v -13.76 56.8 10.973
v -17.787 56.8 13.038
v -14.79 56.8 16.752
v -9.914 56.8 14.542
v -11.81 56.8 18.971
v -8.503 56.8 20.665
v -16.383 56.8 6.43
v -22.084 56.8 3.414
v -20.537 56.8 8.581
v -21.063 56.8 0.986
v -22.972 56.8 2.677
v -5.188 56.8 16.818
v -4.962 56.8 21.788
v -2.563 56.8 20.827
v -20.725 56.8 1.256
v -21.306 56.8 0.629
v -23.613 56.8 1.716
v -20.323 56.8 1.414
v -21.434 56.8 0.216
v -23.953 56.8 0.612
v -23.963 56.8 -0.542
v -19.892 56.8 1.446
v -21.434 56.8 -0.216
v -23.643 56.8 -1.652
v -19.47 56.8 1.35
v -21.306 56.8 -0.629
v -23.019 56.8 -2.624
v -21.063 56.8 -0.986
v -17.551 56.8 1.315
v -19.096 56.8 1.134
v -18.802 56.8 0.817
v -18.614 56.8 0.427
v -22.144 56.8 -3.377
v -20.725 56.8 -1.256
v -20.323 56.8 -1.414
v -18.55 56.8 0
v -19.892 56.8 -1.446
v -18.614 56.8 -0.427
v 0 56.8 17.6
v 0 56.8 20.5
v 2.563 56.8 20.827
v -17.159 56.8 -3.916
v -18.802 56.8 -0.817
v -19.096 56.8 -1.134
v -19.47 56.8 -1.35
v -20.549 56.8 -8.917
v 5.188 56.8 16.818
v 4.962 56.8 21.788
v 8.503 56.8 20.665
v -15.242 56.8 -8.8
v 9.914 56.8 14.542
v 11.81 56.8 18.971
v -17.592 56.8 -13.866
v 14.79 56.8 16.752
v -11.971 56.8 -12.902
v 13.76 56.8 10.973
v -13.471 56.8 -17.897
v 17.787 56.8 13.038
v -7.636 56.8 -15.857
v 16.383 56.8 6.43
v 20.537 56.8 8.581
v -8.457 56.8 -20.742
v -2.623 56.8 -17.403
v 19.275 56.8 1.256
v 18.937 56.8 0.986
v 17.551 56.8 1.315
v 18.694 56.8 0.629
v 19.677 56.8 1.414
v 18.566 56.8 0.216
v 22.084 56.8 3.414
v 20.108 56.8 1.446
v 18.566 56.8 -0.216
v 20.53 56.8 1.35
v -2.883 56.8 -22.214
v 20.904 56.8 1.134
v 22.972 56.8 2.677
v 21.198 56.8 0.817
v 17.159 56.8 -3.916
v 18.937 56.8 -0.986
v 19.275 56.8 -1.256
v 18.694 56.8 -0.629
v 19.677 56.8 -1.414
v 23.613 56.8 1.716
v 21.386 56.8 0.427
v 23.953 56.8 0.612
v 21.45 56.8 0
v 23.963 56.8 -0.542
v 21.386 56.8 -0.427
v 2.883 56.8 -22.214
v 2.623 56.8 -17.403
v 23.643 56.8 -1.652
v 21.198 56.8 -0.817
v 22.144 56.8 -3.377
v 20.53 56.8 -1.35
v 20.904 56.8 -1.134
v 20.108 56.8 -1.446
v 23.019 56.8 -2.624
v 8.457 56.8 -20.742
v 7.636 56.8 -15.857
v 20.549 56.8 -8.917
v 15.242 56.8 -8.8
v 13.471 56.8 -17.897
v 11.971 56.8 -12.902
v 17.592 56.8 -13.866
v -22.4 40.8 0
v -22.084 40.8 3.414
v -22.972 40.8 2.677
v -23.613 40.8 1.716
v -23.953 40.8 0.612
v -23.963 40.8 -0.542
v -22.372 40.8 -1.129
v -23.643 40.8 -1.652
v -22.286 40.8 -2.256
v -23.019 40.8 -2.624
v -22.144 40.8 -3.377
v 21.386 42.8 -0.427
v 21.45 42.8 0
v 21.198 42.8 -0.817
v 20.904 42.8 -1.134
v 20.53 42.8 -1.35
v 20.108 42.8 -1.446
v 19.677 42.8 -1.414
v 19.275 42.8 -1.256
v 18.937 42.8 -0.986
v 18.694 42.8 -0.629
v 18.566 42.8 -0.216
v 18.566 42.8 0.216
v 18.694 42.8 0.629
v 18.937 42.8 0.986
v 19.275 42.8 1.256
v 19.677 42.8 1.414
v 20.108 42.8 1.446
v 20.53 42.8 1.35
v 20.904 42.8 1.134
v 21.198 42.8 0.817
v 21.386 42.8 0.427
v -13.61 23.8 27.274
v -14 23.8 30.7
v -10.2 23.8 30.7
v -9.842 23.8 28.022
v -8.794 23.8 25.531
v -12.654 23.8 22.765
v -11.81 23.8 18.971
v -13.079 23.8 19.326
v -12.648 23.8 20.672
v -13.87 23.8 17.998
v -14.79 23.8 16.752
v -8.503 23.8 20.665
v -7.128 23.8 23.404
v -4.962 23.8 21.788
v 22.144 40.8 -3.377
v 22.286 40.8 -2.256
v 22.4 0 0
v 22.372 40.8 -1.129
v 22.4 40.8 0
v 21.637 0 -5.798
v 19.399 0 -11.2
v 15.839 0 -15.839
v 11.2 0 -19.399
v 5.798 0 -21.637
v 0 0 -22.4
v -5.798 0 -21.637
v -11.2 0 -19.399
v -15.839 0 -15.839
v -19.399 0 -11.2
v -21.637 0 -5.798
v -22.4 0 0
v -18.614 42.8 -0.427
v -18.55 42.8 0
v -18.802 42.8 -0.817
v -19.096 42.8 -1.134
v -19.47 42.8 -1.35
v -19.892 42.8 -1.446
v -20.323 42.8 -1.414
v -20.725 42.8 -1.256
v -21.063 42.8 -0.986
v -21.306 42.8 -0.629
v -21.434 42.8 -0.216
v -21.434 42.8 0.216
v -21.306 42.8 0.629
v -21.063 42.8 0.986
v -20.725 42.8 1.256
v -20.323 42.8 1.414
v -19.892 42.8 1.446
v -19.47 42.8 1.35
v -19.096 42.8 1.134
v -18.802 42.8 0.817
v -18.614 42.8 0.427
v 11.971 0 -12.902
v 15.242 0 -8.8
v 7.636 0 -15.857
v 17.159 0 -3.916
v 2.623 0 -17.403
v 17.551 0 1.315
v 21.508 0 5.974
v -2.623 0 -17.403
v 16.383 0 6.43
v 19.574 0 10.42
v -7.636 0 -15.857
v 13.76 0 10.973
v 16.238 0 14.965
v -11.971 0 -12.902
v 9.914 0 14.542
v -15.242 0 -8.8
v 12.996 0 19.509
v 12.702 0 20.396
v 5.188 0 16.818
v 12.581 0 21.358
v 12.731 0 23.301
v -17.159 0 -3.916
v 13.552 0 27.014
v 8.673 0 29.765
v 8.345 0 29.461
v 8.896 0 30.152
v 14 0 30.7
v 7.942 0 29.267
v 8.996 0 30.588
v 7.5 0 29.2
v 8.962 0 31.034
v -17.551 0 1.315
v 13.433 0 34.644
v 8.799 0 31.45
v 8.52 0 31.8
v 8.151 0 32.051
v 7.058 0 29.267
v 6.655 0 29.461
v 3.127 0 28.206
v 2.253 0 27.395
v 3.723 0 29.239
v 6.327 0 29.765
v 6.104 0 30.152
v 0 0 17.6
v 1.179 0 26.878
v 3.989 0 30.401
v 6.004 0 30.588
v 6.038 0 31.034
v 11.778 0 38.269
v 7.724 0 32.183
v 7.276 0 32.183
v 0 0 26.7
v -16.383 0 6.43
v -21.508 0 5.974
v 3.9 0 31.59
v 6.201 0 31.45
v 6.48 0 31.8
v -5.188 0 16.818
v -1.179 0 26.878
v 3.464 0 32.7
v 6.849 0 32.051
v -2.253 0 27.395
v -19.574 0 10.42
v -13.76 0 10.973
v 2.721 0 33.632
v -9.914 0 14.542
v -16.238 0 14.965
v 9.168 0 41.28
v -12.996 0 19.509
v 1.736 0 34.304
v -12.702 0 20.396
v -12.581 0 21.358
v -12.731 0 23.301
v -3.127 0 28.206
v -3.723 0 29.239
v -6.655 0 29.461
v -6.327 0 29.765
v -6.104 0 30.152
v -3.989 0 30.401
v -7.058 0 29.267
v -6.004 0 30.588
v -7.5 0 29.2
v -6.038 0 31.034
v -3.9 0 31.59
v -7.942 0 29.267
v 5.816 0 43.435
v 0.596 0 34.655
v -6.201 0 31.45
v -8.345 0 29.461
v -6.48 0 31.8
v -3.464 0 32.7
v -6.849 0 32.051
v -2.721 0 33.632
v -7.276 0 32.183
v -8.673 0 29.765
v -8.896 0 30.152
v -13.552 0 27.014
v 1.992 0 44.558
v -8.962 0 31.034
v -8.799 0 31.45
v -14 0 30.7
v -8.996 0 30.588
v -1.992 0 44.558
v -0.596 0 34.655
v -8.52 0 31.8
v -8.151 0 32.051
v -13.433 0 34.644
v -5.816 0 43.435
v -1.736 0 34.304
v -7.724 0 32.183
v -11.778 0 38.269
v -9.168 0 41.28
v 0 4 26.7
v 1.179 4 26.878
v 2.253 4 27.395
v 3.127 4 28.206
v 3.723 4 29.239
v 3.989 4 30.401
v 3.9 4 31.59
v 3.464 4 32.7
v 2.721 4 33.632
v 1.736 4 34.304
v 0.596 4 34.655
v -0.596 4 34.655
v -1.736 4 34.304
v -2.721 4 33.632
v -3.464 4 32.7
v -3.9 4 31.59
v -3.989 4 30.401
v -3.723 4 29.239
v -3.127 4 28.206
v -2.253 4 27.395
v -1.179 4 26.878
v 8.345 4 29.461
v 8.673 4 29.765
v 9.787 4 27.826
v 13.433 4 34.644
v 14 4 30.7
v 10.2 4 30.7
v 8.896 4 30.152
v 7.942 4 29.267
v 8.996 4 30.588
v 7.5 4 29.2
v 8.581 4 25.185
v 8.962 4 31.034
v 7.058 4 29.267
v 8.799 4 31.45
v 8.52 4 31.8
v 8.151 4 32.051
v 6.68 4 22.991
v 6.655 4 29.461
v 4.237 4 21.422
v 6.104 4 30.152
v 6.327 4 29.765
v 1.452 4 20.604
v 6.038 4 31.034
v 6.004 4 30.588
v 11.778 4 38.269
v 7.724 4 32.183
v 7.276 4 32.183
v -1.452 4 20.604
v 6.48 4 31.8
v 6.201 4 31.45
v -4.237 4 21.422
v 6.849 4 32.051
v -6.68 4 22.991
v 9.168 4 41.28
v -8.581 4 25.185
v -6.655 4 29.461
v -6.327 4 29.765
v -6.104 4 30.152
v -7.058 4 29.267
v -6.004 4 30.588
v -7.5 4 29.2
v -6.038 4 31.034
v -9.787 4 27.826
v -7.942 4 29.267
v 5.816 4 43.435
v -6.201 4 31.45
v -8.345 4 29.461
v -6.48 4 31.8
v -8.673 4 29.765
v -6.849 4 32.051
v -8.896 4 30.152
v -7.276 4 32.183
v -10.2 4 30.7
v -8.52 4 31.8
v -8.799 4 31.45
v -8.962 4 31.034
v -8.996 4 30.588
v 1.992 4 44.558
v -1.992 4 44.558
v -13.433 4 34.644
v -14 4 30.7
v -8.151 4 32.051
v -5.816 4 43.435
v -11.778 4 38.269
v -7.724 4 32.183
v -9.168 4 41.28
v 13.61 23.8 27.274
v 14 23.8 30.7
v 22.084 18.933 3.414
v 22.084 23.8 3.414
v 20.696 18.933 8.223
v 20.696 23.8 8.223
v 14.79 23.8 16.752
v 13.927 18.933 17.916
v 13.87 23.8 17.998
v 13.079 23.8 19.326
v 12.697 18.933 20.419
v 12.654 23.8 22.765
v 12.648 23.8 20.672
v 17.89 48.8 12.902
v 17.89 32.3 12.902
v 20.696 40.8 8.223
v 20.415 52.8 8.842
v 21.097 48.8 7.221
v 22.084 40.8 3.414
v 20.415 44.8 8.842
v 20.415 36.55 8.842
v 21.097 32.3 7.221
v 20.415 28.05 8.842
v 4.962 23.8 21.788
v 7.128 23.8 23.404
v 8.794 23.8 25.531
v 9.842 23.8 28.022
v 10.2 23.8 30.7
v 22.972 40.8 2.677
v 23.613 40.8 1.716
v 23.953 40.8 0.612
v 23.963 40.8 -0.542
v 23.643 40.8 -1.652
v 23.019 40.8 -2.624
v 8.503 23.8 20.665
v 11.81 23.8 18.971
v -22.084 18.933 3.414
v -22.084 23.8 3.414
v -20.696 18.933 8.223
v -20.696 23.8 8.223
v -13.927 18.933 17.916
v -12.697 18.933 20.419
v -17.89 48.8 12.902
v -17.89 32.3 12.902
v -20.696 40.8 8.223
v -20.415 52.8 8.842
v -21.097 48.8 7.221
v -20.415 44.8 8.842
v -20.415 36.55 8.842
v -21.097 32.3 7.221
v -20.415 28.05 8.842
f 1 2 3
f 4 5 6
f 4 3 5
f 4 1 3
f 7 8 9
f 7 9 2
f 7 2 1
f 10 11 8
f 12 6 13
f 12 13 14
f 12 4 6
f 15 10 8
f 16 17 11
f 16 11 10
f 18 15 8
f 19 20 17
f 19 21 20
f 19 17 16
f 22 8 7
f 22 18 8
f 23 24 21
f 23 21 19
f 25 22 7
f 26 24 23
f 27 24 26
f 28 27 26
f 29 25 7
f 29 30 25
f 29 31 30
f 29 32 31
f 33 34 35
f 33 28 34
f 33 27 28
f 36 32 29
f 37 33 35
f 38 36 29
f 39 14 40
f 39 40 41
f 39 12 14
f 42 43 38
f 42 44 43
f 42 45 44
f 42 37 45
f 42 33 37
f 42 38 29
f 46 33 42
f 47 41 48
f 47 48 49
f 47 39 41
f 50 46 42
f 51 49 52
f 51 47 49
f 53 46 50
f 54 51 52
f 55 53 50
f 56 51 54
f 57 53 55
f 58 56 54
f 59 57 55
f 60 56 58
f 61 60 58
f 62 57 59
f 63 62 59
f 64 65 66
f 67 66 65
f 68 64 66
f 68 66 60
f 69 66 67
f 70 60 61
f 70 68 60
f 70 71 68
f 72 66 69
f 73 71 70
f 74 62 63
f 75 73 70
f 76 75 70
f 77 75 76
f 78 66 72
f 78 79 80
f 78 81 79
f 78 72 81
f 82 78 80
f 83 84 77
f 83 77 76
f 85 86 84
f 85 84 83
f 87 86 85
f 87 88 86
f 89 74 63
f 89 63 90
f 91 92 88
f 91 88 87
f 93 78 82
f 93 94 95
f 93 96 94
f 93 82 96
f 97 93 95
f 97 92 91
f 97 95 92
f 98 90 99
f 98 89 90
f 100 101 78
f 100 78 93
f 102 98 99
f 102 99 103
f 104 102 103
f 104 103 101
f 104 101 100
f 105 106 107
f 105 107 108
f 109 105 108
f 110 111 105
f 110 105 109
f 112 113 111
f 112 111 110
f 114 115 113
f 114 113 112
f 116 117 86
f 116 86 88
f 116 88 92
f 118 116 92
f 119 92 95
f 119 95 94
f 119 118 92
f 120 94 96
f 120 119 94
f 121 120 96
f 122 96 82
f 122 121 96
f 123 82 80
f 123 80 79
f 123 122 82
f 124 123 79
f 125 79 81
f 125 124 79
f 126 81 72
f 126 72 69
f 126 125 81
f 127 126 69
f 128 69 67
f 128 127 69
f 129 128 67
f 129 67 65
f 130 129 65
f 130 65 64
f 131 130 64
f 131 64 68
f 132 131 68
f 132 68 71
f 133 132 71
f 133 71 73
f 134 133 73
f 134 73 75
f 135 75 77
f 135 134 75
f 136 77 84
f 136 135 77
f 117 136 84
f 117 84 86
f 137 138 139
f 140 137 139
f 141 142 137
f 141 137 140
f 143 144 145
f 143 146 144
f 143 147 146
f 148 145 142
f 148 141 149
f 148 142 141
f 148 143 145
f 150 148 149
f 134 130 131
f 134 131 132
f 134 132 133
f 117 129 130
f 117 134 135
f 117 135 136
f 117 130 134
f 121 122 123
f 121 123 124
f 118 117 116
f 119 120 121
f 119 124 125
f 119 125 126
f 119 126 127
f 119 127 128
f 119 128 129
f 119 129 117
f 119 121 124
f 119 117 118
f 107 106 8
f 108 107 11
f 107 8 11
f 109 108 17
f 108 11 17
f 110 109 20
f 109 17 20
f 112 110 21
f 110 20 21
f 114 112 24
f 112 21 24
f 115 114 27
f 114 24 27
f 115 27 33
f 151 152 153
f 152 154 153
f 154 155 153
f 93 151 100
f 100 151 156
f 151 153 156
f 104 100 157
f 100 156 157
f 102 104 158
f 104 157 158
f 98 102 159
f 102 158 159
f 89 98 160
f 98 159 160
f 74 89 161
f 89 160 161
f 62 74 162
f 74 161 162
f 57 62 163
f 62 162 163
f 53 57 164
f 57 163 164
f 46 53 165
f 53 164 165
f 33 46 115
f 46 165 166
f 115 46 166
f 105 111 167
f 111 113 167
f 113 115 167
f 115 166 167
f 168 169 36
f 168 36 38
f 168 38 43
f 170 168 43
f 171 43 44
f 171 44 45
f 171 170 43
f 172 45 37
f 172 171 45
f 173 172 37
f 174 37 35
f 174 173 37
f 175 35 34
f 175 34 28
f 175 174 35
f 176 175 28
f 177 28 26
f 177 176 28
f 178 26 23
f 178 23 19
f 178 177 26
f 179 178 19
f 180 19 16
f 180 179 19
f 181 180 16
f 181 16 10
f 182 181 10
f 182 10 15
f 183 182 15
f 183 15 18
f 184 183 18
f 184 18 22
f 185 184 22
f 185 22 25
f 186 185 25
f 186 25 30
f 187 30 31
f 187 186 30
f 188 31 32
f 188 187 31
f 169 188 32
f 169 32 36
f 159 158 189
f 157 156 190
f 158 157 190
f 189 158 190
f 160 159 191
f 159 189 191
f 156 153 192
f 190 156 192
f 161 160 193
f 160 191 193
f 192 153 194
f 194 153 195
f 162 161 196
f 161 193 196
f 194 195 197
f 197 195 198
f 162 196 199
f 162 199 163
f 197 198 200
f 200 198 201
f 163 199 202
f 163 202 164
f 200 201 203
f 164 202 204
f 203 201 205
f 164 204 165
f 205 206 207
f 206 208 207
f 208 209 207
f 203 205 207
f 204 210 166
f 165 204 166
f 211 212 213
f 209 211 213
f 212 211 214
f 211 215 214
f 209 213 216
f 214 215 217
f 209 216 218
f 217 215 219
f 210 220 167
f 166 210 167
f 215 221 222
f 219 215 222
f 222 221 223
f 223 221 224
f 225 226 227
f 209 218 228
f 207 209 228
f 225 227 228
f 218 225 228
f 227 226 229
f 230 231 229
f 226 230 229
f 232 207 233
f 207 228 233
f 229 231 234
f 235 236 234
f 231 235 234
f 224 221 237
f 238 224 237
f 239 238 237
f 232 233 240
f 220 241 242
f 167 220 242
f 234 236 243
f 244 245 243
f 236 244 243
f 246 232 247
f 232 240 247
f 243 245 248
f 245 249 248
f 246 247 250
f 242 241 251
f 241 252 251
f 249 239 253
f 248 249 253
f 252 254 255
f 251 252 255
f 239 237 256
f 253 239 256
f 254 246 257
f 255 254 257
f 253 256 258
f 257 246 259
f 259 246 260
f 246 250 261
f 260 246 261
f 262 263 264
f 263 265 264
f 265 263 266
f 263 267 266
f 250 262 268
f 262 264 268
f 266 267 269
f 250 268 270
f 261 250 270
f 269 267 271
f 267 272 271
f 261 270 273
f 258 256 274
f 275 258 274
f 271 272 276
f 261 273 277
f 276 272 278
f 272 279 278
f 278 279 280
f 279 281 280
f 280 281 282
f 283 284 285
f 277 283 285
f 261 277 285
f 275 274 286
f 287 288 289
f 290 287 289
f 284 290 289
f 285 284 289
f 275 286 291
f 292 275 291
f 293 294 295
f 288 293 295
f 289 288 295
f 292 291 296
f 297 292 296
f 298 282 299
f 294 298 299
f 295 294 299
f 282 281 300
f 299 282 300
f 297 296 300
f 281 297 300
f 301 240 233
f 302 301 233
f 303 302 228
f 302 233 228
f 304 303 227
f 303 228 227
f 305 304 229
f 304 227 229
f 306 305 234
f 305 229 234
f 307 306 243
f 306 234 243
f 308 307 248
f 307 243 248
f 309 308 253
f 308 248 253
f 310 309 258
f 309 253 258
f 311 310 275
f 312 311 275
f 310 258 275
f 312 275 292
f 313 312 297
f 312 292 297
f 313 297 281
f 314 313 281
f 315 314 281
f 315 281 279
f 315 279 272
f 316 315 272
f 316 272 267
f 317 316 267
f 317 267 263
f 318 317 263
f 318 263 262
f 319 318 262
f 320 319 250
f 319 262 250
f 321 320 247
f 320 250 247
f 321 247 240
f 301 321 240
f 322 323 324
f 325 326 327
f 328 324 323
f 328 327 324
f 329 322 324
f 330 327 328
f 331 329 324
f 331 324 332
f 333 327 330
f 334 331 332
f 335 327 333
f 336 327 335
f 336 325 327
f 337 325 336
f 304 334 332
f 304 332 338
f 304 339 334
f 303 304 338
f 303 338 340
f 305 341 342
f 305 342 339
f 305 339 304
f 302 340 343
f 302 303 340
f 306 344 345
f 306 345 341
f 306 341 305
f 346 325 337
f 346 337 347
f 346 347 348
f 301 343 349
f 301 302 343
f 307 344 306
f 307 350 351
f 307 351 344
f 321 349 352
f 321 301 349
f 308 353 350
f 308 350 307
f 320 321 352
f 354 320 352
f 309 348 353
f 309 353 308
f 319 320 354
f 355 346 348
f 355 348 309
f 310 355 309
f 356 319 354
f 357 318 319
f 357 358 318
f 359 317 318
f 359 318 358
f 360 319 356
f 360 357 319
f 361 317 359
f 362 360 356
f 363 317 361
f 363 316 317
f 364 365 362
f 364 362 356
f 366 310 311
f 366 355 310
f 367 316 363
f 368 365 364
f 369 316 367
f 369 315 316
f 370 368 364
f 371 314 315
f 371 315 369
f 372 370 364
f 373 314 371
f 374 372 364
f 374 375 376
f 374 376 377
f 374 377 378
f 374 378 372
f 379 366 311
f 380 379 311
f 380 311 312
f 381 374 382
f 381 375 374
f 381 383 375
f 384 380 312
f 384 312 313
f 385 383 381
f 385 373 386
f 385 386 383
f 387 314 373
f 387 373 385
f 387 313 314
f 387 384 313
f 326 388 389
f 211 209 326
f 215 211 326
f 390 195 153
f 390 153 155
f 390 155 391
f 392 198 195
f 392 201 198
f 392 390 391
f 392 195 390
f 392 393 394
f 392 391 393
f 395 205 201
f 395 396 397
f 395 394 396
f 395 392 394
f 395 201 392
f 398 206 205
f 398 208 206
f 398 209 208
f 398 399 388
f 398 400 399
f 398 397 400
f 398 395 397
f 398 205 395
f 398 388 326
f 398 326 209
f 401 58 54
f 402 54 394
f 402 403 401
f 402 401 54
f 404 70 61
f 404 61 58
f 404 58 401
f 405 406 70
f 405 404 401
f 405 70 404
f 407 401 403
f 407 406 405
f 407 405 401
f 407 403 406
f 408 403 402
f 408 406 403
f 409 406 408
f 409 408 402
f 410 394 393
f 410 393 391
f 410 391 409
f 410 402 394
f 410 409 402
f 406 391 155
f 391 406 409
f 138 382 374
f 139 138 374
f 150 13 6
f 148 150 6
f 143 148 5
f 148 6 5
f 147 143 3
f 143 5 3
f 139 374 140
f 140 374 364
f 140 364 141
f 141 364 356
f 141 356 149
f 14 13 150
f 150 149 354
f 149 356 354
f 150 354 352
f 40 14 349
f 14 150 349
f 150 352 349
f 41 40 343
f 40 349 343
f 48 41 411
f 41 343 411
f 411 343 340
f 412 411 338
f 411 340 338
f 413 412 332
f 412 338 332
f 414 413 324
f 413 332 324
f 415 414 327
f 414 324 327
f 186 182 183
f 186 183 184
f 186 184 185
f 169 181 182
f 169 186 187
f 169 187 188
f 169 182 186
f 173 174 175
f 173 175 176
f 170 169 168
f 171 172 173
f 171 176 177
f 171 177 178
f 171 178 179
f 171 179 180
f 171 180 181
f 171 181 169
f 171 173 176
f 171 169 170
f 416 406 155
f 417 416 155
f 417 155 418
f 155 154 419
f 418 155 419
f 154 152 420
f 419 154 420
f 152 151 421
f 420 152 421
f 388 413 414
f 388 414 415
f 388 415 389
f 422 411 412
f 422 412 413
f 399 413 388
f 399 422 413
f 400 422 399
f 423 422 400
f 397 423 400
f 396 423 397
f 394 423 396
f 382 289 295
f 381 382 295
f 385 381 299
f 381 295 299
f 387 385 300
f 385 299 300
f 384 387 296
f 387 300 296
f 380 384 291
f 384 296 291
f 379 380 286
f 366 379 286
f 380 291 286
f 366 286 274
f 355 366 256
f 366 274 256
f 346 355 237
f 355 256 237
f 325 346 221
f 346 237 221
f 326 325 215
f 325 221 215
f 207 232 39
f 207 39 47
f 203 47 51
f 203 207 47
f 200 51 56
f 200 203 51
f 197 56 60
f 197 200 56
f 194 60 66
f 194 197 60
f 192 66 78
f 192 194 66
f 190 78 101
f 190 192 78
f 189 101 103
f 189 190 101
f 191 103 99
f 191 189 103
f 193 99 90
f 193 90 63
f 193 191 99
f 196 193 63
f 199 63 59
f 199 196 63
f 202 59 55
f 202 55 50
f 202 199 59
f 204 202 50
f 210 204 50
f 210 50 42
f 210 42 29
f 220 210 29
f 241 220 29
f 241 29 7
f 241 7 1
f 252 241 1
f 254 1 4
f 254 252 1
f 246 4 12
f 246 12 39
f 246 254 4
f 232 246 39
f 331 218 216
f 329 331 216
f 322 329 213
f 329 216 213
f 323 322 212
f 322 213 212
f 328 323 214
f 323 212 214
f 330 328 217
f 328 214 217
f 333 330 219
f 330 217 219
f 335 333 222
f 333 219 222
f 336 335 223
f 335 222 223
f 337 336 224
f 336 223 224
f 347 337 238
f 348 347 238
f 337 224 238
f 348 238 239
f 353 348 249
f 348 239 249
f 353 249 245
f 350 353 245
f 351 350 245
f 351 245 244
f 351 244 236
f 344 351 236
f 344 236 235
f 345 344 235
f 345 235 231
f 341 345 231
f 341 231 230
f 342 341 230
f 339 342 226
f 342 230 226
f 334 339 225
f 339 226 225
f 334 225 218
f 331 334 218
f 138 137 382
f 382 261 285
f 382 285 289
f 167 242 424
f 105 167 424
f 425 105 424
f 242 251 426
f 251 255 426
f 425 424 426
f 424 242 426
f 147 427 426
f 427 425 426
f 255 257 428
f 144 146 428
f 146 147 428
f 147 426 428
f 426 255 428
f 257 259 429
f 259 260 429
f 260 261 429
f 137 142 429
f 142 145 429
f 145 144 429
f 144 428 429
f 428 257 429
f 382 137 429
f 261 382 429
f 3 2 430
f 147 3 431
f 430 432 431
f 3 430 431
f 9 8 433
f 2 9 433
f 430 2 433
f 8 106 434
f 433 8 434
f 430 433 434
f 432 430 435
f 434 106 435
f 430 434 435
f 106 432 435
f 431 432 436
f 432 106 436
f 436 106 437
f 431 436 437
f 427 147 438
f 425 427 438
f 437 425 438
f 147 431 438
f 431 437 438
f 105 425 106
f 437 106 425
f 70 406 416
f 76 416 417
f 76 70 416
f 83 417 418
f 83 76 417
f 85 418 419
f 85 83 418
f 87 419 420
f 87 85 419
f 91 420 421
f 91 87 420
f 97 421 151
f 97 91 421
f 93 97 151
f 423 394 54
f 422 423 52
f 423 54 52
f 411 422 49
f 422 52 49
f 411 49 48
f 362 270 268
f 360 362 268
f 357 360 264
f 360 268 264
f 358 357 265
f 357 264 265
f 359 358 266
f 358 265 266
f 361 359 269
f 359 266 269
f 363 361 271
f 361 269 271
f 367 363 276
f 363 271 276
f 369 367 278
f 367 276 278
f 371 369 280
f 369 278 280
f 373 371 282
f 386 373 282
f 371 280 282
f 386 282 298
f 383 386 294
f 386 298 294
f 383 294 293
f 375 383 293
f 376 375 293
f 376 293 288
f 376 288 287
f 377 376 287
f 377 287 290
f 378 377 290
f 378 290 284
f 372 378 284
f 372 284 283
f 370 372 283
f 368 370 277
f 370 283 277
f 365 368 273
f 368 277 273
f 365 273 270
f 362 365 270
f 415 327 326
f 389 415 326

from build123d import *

# Parameters (mm, degrees)
SKETCH1_R              = 17.6
BOSS_EXTRUDE1_DEPTH    = 56.8
BOSS_EXTRUDE2_DEPTH    = 4
SKETCH4_R              = 4
SKETCH4_R_2            = 1.5
CUT_EXTRUDE1_DEPTH     = 4
BOSS_EXTRUDE3_DEPTH    = 16
CUT_EXTRUDE2_START     = -14
CUT_EXTRUDE2_OUTLINE_R = 1.45
CUT_EXTRUDE2_DEPTH     = 14
CUT_EXTRUDE3_DEPTH     = 33


# Read off the part's stored shape, not the designer's step: Cut-Extrude2
with BuildPart() as part:
    # Sketch1 → Boss-Extrude1 (new body)
    with BuildSketch(Plane(origin=(0, 0, 0), x_dir=(1, 0, 0), z_dir=(0, 1, 0))):
        with BuildLine():
            Line((-14, -30.7), (-10.2, -30.7))
            ThreePointArc((-10.2, -30.7), (0, -20.5), (10.2, -30.7))
            Line((10.2, -30.7), (14, -30.7))
            add(Edge.make_bspline(
                [(22.4, 0), (22.107939007, -9.890498416), (16.256040946, -13.947885017), (11.388120446, -21.994772931), (14.153535086, -27.339514928), (14, -30.7)],
                knots=[0, 0, 0, 0, 0.589197799, 0.689197799, 1, 1, 1, 1], degree=3))
            ThreePointArc((22.4, 0), (0, 22.4), (-22.4, 0))
            add(Edge.make_bspline(
                [(-22.4, 0), (-22.107939007, -9.890498416), (-16.256040946, -13.947885017), (-11.388120446, -21.994772931), (-14.153535086, -27.339514928), (-14, -30.7)],
                knots=[0, 0, 0, 0, 0.589197799, 0.689197799, 1, 1, 1, 1], degree=3))
        make_face()
        with Locations(Location((0, 0, 0), (0, 0, 270))):
            Circle(SKETCH1_R, mode=Mode.SUBTRACT)
    extrude(amount=BOSS_EXTRUDE1_DEPTH)

    # Sketch3 → Boss-Extrude2 (add)
    with BuildSketch(Plane.XZ):
        with BuildLine():
            ThreePointArc((-14, 30.7), (0, 44.7), (14, 30.7))
            add(Edge.make_bspline(
                [(-14, 30.7), (-12.62265513, 25.007813603), (0.167580012, 13.239499872), (11.954859233, 25.492817672), (14, 30.7)],
                knots=[0, 0, 0, 0, 0.503384006, 1, 1, 1, 1], degree=3))
        make_face()
    extrude(amount=-BOSS_EXTRUDE2_DEPTH)

    # Sketch4 → Cut-Extrude1 (cut)
    with BuildSketch(Plane.XZ):
        with Locations(Location((0, 30.7, 0), (0, 0, 270))):
            Circle(SKETCH4_R)
        with Locations(Location((-7.5, 30.7, 0), (0, 0, 270))):
            Circle(SKETCH4_R_2)
        with Locations(Location((7.5, 30.7, 0), (0, 0, 270))):
            Circle(SKETCH4_R_2)
    extrude(amount=-CUT_EXTRUDE1_DEPTH, mode=Mode.SUBTRACT)

    # Sketch5 → Boss-Extrude3 (add)
    with BuildSketch(Plane(origin=(0, 56.8, 0), x_dir=(1, 0, 0), z_dir=(0, 1, 0))):
        with BuildLine():
            Line((20, 4), (20, -4))
            ThreePointArc((20, -4), (24, 0), (20, 4))
        make_face()
        with BuildLine():
            Line((-20, 4), (-20, -4))
            ThreePointArc((-20, -4), (-24, 0), (-20, 4))
        make_face()
    extrude(amount=-BOSS_EXTRUDE3_DEPTH)

    # Cut-Extrude2 outline → Cut-Extrude2 (cut)
    with BuildSketch(Plane(origin=(0, 56.8, 0), x_dir=(1, 0, 0), z_dir=(0, 1, 0)).offset(CUT_EXTRUDE2_START)):
        with Locations((20, 0)):
            Circle(CUT_EXTRUDE2_OUTLINE_R)
        with Locations((-20, 0)):
            Circle(CUT_EXTRUDE2_OUTLINE_R)
    extrude(amount=CUT_EXTRUDE2_DEPTH, mode=Mode.SUBTRACT)

    # Sketch7 → Cut-Extrude3 (cut)
    with BuildSketch(Plane(origin=(0, 56.8, 0), x_dir=(1, 0, 0), z_dir=(0, 1, 0))):
        with BuildLine():
            Line((-22.083760266, -3.414373025), (-36.083760266, -3.414373025))
            ThreePointArc((-36.083760266, -3.414373025), (0, -36.244940311), (36.083760266, -3.414373025))
            Line((36.083760266, -3.414373025), (22.083760266, -3.414373025))
            ThreePointArc((22.083760266, -3.414373025), (0, -22.346149795), (-22.083760266, -3.414373025))
        make_face()
    extrude(amount=-CUT_EXTRUDE3_DEPTH, mode=Mode.SUBTRACT)


solid = part.part
